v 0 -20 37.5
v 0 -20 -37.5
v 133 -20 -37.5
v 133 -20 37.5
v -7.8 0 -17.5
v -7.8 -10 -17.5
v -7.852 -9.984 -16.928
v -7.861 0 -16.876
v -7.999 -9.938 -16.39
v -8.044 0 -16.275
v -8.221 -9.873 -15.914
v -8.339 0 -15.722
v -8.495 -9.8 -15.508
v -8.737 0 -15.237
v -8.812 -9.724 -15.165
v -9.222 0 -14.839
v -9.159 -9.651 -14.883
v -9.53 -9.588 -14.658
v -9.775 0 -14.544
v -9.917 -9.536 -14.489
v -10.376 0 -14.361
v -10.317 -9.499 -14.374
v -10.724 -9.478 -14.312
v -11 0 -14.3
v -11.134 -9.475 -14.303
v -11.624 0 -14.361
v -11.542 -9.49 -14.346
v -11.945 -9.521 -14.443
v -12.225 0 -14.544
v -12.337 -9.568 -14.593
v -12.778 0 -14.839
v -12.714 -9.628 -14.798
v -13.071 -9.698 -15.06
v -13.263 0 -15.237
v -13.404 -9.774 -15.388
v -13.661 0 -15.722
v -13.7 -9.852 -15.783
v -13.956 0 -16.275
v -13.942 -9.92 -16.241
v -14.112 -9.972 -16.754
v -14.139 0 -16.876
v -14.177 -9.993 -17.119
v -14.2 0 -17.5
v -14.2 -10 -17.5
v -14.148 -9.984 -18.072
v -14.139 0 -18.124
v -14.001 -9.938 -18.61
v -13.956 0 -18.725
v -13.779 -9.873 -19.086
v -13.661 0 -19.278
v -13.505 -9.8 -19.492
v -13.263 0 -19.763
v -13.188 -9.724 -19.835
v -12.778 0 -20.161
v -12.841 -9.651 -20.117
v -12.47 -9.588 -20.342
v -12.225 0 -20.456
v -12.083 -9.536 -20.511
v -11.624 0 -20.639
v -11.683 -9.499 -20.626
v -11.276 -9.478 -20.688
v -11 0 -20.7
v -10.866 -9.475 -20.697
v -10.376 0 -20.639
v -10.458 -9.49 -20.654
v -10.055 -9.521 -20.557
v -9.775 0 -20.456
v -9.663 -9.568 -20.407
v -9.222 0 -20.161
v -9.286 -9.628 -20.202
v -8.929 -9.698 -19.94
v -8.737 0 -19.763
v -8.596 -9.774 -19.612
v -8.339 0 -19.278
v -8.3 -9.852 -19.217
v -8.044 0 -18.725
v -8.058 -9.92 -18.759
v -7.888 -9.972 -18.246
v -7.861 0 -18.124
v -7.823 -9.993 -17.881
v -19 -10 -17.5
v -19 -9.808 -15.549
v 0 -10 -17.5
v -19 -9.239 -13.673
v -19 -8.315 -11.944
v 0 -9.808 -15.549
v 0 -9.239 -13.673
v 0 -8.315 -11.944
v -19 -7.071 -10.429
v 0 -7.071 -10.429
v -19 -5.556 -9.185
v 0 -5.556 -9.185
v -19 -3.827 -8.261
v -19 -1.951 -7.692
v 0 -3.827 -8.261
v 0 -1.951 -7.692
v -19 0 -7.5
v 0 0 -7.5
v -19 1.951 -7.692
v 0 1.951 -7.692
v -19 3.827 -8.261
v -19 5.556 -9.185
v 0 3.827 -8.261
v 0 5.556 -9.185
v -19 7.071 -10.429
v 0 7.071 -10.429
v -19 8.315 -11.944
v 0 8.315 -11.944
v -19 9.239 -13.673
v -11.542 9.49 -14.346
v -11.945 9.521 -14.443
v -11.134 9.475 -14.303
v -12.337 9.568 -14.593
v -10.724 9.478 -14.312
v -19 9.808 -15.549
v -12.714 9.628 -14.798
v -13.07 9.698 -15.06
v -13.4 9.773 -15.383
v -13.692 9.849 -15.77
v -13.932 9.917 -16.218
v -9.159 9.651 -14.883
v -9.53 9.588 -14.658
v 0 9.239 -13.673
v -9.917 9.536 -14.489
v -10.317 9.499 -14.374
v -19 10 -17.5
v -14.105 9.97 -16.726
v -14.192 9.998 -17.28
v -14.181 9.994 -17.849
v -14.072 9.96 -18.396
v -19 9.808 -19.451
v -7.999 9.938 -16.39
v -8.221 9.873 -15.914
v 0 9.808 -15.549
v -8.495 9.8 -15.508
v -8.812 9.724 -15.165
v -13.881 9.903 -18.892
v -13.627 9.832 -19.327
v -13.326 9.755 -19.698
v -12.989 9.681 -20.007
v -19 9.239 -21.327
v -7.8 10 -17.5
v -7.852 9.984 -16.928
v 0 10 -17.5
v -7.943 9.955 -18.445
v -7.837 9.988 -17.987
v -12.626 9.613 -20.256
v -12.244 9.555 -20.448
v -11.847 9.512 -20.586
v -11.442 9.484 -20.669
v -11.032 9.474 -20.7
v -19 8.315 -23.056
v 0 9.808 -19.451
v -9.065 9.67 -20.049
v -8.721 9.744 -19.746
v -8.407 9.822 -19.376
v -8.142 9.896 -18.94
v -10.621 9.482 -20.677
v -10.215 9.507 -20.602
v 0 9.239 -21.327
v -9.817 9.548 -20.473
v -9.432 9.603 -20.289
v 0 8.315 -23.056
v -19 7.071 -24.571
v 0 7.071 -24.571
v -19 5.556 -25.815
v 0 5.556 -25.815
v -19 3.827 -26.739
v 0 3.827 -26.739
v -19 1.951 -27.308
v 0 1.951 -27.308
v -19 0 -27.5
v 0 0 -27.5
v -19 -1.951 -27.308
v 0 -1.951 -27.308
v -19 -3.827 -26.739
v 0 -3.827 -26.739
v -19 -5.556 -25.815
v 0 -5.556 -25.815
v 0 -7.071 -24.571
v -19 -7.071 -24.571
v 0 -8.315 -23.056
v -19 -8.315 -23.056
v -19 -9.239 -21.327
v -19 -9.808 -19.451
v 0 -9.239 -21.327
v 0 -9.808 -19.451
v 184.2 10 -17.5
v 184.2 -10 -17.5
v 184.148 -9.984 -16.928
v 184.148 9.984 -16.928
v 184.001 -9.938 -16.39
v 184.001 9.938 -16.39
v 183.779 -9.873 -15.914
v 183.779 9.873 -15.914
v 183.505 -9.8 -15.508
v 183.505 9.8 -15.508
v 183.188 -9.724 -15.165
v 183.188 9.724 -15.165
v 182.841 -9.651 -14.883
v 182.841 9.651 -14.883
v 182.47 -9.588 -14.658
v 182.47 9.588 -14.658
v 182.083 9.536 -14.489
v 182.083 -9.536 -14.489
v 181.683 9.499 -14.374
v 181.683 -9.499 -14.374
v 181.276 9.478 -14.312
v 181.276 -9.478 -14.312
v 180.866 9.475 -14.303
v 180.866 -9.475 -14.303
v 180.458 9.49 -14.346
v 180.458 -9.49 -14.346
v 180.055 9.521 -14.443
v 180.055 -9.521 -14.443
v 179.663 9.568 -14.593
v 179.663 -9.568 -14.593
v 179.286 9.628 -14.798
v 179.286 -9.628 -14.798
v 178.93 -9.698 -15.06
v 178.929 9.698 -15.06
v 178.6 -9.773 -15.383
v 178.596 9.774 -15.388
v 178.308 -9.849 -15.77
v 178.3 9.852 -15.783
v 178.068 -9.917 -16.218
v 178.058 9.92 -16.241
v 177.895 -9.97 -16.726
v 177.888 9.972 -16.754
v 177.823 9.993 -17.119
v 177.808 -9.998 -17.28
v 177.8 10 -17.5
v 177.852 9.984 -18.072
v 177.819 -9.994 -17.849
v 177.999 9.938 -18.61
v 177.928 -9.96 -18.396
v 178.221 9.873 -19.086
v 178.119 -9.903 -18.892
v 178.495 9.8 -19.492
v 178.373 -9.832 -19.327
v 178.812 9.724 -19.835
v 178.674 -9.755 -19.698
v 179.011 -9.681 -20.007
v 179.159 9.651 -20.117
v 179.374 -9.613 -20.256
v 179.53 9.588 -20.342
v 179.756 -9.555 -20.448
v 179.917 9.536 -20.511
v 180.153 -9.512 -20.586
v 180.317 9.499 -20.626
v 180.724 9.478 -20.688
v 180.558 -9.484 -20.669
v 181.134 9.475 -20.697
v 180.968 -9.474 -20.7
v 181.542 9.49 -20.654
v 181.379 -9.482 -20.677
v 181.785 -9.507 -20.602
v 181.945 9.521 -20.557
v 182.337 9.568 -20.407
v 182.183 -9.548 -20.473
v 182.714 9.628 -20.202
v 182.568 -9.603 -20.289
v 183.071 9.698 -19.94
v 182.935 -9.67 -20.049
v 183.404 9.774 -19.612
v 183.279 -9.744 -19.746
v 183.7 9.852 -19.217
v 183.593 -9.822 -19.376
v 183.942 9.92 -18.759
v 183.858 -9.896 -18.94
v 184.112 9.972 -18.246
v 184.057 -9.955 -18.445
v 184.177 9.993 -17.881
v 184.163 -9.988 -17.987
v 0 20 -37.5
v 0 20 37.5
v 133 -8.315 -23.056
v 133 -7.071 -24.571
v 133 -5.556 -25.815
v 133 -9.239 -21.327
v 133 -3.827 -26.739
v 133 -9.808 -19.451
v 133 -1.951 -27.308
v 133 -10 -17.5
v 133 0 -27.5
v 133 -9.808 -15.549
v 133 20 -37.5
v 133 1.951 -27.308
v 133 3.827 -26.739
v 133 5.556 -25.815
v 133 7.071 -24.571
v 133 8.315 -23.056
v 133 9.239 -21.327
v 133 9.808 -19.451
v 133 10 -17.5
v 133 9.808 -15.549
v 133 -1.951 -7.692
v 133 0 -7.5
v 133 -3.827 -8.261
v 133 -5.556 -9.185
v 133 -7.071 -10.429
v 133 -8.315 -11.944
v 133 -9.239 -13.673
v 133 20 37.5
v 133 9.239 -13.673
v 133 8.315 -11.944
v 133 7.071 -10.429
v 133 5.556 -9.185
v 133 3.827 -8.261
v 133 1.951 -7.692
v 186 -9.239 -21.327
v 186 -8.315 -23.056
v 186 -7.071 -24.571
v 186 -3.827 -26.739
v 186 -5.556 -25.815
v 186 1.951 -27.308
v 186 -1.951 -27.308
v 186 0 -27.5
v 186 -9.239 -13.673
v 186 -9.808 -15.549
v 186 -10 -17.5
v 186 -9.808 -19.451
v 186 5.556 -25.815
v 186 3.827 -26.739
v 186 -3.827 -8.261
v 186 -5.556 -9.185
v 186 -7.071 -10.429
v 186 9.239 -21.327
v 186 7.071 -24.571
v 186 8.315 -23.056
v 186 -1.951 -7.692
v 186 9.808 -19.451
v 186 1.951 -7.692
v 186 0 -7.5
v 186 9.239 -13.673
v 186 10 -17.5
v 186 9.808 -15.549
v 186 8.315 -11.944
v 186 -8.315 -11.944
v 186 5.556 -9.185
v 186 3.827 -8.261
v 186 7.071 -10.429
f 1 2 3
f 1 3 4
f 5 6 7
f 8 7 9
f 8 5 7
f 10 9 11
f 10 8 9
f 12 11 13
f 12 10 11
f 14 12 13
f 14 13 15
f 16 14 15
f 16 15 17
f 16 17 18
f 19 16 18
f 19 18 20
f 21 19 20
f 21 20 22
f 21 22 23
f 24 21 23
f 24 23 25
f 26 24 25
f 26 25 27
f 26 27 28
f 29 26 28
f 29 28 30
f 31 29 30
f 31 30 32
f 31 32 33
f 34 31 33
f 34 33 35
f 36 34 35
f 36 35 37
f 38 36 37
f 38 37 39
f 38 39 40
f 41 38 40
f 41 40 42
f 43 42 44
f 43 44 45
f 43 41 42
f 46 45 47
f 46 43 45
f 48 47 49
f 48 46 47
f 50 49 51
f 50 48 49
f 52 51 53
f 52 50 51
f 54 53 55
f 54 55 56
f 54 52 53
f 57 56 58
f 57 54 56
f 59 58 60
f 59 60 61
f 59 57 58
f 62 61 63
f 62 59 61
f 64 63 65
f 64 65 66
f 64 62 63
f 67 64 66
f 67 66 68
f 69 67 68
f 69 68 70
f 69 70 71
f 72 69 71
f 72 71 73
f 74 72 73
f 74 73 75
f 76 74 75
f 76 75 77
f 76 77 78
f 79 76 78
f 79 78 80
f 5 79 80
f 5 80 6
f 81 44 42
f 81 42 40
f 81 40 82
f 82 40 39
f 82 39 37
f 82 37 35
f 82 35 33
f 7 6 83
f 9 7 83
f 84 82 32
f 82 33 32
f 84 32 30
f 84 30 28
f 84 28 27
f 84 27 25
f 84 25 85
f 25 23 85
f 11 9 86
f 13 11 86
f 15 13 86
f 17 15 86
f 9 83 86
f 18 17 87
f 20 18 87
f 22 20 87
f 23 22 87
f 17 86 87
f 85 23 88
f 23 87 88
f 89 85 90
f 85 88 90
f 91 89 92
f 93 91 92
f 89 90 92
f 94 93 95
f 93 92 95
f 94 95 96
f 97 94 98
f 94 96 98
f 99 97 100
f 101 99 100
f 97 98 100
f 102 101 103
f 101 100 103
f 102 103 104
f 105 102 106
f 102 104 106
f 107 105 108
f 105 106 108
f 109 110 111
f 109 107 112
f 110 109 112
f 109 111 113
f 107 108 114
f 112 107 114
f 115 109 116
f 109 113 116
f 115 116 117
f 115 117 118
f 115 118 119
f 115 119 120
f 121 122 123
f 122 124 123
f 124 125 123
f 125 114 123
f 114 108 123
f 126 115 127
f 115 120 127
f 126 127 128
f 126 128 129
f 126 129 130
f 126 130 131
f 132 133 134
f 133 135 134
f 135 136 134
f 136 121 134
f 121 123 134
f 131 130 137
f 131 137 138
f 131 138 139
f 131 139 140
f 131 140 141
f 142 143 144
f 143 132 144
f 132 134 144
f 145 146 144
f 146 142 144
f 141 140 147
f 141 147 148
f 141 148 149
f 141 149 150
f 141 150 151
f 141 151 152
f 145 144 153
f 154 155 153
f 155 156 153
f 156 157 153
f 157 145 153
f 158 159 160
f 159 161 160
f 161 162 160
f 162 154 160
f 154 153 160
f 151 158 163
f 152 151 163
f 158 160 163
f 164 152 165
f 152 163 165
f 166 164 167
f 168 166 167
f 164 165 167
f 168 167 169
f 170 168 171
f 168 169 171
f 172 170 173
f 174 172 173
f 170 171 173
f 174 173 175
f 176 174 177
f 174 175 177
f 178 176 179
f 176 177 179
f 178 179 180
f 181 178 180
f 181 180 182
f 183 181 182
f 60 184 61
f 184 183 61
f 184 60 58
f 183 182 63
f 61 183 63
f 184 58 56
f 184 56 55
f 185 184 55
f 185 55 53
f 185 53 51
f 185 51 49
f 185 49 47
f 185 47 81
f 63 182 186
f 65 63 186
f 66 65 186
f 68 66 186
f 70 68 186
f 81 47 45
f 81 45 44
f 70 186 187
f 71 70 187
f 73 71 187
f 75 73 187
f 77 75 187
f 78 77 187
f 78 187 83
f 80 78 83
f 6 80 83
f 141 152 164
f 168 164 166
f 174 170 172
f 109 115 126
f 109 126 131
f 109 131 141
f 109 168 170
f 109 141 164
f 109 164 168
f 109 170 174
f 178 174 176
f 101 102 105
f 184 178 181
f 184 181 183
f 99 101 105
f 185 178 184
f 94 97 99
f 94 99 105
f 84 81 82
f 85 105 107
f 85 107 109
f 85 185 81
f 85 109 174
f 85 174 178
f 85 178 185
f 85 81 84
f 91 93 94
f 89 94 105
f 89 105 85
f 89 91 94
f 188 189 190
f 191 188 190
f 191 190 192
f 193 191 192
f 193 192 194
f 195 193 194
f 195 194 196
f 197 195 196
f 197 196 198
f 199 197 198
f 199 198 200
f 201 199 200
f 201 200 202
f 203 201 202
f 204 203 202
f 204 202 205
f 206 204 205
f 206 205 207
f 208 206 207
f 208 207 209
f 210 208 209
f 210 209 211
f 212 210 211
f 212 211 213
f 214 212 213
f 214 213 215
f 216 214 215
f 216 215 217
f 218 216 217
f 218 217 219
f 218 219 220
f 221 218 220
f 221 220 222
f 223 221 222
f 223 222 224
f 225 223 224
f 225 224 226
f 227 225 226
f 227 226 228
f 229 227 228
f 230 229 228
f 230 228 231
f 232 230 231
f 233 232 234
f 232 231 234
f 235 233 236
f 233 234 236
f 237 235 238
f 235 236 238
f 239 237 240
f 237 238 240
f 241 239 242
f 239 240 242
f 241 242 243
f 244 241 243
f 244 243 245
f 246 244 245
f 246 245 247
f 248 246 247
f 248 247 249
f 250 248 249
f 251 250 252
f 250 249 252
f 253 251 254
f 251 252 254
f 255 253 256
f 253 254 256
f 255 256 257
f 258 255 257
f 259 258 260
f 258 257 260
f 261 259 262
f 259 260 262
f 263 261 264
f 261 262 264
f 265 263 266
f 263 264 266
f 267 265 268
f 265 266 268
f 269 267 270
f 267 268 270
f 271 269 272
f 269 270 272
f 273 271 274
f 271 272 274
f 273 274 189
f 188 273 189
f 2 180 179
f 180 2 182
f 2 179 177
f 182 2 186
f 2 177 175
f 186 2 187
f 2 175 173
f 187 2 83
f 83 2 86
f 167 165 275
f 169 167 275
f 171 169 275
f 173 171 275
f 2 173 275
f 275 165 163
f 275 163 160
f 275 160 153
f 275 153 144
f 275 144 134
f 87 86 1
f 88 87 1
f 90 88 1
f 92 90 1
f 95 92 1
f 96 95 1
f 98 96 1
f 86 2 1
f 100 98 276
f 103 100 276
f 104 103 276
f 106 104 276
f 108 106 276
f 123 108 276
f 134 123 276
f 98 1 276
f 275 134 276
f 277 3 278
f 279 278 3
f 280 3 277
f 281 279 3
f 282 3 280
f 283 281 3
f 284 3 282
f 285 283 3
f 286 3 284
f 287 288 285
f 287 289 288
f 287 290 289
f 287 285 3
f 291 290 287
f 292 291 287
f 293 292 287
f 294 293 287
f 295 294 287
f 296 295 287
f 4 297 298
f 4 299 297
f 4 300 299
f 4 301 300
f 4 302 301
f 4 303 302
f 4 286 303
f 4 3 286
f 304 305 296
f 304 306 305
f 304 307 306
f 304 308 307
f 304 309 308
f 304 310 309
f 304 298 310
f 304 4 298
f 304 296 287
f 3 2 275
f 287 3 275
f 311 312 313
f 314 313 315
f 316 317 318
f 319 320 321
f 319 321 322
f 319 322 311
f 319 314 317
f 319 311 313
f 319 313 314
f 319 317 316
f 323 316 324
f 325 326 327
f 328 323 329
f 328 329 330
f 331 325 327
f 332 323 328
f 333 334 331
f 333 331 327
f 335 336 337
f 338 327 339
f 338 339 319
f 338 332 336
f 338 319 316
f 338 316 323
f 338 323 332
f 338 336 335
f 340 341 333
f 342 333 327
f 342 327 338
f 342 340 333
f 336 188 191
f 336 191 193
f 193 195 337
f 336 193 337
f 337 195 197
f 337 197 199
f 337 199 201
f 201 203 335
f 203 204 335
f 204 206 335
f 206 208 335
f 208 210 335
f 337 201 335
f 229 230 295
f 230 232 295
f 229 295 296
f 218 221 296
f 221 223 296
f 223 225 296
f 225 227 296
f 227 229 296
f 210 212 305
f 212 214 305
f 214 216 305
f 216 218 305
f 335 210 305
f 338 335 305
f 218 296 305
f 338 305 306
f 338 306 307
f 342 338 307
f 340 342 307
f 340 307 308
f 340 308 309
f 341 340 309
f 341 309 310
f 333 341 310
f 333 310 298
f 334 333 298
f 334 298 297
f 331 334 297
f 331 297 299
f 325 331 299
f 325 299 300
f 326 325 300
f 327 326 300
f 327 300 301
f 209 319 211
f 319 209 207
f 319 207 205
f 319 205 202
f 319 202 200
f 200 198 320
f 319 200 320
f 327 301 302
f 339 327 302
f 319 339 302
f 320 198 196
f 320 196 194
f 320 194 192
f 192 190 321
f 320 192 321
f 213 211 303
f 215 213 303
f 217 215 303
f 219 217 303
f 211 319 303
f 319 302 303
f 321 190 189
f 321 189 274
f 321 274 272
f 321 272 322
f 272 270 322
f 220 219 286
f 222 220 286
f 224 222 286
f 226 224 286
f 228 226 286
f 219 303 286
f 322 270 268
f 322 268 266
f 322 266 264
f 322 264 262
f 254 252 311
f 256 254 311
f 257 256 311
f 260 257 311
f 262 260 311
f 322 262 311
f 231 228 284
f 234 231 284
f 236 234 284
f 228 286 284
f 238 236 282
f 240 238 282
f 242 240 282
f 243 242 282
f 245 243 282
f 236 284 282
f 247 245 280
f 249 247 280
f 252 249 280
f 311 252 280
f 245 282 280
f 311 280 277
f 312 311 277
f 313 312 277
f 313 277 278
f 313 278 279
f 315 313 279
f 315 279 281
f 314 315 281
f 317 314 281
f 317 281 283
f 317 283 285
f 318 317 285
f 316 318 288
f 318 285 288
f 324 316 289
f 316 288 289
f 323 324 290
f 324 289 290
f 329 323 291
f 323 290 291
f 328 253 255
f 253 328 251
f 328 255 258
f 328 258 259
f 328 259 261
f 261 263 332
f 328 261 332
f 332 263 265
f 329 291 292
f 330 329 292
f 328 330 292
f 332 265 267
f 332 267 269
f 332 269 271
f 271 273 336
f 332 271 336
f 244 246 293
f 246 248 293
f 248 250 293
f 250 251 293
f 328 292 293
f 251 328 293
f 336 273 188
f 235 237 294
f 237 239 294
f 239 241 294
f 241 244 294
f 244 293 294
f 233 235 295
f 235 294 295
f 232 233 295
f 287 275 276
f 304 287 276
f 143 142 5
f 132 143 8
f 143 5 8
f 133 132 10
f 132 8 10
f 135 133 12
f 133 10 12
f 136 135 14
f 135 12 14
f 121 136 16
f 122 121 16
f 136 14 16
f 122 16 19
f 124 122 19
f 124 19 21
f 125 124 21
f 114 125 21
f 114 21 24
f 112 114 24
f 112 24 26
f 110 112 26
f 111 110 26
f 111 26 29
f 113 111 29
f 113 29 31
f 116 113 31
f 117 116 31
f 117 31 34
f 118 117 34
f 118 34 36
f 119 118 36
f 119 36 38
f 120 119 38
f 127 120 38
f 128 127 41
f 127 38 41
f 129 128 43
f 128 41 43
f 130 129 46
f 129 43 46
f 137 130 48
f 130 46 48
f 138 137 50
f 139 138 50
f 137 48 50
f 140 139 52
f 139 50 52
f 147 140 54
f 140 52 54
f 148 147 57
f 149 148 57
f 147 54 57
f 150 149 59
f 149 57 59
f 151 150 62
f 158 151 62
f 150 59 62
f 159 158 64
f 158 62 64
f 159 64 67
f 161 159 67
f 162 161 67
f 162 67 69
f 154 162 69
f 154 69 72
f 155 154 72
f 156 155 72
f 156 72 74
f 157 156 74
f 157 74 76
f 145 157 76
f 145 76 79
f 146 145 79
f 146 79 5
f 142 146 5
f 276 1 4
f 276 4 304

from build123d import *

# Parameters (mm, degrees)
F0_W     = 40
F0_H     = 75
F1_DEPTH = 133
F2_R     = 10
F3_DEPTH = 19
F4_R     = 10
F6_DEPTH = 53
F5_R     = 3.2
F7_DEPTH = 12.5


with BuildPart() as f1:
    # F0 (on Right) → F1 (new body)
    with BuildSketch(Plane.YZ):
        Rectangle(F0_W, F0_H)
    extrude(amount=F1_DEPTH)

    # F2 (on face) → F3 (join)
    with BuildSketch(Plane(origin=(0, 0, 0), x_dir=(0, -1, 0), z_dir=(-1, 0, 0))):
        with Locations((0, -17.5)):
            Circle(F2_R)
    extrude(amount=F3_DEPTH)

    # F4 (on face) → F6 (join)
    with BuildSketch(Plane.YZ.offset(133)):
        with Locations((0, -17.5)):
            Circle(F4_R)
    extrude(amount=F6_DEPTH)

    # F5 (on Front) → F7 (cut, symmetric)
    with BuildSketch(Plane.XZ):
        with Locations((-11, -17.5)):
            Circle(F5_R)
        with Locations((181, -17.5)):
            Circle(F5_R)
    extrude(amount=F7_DEPTH, both=True, mode=Mode.SUBTRACT)


solid = f1.part
